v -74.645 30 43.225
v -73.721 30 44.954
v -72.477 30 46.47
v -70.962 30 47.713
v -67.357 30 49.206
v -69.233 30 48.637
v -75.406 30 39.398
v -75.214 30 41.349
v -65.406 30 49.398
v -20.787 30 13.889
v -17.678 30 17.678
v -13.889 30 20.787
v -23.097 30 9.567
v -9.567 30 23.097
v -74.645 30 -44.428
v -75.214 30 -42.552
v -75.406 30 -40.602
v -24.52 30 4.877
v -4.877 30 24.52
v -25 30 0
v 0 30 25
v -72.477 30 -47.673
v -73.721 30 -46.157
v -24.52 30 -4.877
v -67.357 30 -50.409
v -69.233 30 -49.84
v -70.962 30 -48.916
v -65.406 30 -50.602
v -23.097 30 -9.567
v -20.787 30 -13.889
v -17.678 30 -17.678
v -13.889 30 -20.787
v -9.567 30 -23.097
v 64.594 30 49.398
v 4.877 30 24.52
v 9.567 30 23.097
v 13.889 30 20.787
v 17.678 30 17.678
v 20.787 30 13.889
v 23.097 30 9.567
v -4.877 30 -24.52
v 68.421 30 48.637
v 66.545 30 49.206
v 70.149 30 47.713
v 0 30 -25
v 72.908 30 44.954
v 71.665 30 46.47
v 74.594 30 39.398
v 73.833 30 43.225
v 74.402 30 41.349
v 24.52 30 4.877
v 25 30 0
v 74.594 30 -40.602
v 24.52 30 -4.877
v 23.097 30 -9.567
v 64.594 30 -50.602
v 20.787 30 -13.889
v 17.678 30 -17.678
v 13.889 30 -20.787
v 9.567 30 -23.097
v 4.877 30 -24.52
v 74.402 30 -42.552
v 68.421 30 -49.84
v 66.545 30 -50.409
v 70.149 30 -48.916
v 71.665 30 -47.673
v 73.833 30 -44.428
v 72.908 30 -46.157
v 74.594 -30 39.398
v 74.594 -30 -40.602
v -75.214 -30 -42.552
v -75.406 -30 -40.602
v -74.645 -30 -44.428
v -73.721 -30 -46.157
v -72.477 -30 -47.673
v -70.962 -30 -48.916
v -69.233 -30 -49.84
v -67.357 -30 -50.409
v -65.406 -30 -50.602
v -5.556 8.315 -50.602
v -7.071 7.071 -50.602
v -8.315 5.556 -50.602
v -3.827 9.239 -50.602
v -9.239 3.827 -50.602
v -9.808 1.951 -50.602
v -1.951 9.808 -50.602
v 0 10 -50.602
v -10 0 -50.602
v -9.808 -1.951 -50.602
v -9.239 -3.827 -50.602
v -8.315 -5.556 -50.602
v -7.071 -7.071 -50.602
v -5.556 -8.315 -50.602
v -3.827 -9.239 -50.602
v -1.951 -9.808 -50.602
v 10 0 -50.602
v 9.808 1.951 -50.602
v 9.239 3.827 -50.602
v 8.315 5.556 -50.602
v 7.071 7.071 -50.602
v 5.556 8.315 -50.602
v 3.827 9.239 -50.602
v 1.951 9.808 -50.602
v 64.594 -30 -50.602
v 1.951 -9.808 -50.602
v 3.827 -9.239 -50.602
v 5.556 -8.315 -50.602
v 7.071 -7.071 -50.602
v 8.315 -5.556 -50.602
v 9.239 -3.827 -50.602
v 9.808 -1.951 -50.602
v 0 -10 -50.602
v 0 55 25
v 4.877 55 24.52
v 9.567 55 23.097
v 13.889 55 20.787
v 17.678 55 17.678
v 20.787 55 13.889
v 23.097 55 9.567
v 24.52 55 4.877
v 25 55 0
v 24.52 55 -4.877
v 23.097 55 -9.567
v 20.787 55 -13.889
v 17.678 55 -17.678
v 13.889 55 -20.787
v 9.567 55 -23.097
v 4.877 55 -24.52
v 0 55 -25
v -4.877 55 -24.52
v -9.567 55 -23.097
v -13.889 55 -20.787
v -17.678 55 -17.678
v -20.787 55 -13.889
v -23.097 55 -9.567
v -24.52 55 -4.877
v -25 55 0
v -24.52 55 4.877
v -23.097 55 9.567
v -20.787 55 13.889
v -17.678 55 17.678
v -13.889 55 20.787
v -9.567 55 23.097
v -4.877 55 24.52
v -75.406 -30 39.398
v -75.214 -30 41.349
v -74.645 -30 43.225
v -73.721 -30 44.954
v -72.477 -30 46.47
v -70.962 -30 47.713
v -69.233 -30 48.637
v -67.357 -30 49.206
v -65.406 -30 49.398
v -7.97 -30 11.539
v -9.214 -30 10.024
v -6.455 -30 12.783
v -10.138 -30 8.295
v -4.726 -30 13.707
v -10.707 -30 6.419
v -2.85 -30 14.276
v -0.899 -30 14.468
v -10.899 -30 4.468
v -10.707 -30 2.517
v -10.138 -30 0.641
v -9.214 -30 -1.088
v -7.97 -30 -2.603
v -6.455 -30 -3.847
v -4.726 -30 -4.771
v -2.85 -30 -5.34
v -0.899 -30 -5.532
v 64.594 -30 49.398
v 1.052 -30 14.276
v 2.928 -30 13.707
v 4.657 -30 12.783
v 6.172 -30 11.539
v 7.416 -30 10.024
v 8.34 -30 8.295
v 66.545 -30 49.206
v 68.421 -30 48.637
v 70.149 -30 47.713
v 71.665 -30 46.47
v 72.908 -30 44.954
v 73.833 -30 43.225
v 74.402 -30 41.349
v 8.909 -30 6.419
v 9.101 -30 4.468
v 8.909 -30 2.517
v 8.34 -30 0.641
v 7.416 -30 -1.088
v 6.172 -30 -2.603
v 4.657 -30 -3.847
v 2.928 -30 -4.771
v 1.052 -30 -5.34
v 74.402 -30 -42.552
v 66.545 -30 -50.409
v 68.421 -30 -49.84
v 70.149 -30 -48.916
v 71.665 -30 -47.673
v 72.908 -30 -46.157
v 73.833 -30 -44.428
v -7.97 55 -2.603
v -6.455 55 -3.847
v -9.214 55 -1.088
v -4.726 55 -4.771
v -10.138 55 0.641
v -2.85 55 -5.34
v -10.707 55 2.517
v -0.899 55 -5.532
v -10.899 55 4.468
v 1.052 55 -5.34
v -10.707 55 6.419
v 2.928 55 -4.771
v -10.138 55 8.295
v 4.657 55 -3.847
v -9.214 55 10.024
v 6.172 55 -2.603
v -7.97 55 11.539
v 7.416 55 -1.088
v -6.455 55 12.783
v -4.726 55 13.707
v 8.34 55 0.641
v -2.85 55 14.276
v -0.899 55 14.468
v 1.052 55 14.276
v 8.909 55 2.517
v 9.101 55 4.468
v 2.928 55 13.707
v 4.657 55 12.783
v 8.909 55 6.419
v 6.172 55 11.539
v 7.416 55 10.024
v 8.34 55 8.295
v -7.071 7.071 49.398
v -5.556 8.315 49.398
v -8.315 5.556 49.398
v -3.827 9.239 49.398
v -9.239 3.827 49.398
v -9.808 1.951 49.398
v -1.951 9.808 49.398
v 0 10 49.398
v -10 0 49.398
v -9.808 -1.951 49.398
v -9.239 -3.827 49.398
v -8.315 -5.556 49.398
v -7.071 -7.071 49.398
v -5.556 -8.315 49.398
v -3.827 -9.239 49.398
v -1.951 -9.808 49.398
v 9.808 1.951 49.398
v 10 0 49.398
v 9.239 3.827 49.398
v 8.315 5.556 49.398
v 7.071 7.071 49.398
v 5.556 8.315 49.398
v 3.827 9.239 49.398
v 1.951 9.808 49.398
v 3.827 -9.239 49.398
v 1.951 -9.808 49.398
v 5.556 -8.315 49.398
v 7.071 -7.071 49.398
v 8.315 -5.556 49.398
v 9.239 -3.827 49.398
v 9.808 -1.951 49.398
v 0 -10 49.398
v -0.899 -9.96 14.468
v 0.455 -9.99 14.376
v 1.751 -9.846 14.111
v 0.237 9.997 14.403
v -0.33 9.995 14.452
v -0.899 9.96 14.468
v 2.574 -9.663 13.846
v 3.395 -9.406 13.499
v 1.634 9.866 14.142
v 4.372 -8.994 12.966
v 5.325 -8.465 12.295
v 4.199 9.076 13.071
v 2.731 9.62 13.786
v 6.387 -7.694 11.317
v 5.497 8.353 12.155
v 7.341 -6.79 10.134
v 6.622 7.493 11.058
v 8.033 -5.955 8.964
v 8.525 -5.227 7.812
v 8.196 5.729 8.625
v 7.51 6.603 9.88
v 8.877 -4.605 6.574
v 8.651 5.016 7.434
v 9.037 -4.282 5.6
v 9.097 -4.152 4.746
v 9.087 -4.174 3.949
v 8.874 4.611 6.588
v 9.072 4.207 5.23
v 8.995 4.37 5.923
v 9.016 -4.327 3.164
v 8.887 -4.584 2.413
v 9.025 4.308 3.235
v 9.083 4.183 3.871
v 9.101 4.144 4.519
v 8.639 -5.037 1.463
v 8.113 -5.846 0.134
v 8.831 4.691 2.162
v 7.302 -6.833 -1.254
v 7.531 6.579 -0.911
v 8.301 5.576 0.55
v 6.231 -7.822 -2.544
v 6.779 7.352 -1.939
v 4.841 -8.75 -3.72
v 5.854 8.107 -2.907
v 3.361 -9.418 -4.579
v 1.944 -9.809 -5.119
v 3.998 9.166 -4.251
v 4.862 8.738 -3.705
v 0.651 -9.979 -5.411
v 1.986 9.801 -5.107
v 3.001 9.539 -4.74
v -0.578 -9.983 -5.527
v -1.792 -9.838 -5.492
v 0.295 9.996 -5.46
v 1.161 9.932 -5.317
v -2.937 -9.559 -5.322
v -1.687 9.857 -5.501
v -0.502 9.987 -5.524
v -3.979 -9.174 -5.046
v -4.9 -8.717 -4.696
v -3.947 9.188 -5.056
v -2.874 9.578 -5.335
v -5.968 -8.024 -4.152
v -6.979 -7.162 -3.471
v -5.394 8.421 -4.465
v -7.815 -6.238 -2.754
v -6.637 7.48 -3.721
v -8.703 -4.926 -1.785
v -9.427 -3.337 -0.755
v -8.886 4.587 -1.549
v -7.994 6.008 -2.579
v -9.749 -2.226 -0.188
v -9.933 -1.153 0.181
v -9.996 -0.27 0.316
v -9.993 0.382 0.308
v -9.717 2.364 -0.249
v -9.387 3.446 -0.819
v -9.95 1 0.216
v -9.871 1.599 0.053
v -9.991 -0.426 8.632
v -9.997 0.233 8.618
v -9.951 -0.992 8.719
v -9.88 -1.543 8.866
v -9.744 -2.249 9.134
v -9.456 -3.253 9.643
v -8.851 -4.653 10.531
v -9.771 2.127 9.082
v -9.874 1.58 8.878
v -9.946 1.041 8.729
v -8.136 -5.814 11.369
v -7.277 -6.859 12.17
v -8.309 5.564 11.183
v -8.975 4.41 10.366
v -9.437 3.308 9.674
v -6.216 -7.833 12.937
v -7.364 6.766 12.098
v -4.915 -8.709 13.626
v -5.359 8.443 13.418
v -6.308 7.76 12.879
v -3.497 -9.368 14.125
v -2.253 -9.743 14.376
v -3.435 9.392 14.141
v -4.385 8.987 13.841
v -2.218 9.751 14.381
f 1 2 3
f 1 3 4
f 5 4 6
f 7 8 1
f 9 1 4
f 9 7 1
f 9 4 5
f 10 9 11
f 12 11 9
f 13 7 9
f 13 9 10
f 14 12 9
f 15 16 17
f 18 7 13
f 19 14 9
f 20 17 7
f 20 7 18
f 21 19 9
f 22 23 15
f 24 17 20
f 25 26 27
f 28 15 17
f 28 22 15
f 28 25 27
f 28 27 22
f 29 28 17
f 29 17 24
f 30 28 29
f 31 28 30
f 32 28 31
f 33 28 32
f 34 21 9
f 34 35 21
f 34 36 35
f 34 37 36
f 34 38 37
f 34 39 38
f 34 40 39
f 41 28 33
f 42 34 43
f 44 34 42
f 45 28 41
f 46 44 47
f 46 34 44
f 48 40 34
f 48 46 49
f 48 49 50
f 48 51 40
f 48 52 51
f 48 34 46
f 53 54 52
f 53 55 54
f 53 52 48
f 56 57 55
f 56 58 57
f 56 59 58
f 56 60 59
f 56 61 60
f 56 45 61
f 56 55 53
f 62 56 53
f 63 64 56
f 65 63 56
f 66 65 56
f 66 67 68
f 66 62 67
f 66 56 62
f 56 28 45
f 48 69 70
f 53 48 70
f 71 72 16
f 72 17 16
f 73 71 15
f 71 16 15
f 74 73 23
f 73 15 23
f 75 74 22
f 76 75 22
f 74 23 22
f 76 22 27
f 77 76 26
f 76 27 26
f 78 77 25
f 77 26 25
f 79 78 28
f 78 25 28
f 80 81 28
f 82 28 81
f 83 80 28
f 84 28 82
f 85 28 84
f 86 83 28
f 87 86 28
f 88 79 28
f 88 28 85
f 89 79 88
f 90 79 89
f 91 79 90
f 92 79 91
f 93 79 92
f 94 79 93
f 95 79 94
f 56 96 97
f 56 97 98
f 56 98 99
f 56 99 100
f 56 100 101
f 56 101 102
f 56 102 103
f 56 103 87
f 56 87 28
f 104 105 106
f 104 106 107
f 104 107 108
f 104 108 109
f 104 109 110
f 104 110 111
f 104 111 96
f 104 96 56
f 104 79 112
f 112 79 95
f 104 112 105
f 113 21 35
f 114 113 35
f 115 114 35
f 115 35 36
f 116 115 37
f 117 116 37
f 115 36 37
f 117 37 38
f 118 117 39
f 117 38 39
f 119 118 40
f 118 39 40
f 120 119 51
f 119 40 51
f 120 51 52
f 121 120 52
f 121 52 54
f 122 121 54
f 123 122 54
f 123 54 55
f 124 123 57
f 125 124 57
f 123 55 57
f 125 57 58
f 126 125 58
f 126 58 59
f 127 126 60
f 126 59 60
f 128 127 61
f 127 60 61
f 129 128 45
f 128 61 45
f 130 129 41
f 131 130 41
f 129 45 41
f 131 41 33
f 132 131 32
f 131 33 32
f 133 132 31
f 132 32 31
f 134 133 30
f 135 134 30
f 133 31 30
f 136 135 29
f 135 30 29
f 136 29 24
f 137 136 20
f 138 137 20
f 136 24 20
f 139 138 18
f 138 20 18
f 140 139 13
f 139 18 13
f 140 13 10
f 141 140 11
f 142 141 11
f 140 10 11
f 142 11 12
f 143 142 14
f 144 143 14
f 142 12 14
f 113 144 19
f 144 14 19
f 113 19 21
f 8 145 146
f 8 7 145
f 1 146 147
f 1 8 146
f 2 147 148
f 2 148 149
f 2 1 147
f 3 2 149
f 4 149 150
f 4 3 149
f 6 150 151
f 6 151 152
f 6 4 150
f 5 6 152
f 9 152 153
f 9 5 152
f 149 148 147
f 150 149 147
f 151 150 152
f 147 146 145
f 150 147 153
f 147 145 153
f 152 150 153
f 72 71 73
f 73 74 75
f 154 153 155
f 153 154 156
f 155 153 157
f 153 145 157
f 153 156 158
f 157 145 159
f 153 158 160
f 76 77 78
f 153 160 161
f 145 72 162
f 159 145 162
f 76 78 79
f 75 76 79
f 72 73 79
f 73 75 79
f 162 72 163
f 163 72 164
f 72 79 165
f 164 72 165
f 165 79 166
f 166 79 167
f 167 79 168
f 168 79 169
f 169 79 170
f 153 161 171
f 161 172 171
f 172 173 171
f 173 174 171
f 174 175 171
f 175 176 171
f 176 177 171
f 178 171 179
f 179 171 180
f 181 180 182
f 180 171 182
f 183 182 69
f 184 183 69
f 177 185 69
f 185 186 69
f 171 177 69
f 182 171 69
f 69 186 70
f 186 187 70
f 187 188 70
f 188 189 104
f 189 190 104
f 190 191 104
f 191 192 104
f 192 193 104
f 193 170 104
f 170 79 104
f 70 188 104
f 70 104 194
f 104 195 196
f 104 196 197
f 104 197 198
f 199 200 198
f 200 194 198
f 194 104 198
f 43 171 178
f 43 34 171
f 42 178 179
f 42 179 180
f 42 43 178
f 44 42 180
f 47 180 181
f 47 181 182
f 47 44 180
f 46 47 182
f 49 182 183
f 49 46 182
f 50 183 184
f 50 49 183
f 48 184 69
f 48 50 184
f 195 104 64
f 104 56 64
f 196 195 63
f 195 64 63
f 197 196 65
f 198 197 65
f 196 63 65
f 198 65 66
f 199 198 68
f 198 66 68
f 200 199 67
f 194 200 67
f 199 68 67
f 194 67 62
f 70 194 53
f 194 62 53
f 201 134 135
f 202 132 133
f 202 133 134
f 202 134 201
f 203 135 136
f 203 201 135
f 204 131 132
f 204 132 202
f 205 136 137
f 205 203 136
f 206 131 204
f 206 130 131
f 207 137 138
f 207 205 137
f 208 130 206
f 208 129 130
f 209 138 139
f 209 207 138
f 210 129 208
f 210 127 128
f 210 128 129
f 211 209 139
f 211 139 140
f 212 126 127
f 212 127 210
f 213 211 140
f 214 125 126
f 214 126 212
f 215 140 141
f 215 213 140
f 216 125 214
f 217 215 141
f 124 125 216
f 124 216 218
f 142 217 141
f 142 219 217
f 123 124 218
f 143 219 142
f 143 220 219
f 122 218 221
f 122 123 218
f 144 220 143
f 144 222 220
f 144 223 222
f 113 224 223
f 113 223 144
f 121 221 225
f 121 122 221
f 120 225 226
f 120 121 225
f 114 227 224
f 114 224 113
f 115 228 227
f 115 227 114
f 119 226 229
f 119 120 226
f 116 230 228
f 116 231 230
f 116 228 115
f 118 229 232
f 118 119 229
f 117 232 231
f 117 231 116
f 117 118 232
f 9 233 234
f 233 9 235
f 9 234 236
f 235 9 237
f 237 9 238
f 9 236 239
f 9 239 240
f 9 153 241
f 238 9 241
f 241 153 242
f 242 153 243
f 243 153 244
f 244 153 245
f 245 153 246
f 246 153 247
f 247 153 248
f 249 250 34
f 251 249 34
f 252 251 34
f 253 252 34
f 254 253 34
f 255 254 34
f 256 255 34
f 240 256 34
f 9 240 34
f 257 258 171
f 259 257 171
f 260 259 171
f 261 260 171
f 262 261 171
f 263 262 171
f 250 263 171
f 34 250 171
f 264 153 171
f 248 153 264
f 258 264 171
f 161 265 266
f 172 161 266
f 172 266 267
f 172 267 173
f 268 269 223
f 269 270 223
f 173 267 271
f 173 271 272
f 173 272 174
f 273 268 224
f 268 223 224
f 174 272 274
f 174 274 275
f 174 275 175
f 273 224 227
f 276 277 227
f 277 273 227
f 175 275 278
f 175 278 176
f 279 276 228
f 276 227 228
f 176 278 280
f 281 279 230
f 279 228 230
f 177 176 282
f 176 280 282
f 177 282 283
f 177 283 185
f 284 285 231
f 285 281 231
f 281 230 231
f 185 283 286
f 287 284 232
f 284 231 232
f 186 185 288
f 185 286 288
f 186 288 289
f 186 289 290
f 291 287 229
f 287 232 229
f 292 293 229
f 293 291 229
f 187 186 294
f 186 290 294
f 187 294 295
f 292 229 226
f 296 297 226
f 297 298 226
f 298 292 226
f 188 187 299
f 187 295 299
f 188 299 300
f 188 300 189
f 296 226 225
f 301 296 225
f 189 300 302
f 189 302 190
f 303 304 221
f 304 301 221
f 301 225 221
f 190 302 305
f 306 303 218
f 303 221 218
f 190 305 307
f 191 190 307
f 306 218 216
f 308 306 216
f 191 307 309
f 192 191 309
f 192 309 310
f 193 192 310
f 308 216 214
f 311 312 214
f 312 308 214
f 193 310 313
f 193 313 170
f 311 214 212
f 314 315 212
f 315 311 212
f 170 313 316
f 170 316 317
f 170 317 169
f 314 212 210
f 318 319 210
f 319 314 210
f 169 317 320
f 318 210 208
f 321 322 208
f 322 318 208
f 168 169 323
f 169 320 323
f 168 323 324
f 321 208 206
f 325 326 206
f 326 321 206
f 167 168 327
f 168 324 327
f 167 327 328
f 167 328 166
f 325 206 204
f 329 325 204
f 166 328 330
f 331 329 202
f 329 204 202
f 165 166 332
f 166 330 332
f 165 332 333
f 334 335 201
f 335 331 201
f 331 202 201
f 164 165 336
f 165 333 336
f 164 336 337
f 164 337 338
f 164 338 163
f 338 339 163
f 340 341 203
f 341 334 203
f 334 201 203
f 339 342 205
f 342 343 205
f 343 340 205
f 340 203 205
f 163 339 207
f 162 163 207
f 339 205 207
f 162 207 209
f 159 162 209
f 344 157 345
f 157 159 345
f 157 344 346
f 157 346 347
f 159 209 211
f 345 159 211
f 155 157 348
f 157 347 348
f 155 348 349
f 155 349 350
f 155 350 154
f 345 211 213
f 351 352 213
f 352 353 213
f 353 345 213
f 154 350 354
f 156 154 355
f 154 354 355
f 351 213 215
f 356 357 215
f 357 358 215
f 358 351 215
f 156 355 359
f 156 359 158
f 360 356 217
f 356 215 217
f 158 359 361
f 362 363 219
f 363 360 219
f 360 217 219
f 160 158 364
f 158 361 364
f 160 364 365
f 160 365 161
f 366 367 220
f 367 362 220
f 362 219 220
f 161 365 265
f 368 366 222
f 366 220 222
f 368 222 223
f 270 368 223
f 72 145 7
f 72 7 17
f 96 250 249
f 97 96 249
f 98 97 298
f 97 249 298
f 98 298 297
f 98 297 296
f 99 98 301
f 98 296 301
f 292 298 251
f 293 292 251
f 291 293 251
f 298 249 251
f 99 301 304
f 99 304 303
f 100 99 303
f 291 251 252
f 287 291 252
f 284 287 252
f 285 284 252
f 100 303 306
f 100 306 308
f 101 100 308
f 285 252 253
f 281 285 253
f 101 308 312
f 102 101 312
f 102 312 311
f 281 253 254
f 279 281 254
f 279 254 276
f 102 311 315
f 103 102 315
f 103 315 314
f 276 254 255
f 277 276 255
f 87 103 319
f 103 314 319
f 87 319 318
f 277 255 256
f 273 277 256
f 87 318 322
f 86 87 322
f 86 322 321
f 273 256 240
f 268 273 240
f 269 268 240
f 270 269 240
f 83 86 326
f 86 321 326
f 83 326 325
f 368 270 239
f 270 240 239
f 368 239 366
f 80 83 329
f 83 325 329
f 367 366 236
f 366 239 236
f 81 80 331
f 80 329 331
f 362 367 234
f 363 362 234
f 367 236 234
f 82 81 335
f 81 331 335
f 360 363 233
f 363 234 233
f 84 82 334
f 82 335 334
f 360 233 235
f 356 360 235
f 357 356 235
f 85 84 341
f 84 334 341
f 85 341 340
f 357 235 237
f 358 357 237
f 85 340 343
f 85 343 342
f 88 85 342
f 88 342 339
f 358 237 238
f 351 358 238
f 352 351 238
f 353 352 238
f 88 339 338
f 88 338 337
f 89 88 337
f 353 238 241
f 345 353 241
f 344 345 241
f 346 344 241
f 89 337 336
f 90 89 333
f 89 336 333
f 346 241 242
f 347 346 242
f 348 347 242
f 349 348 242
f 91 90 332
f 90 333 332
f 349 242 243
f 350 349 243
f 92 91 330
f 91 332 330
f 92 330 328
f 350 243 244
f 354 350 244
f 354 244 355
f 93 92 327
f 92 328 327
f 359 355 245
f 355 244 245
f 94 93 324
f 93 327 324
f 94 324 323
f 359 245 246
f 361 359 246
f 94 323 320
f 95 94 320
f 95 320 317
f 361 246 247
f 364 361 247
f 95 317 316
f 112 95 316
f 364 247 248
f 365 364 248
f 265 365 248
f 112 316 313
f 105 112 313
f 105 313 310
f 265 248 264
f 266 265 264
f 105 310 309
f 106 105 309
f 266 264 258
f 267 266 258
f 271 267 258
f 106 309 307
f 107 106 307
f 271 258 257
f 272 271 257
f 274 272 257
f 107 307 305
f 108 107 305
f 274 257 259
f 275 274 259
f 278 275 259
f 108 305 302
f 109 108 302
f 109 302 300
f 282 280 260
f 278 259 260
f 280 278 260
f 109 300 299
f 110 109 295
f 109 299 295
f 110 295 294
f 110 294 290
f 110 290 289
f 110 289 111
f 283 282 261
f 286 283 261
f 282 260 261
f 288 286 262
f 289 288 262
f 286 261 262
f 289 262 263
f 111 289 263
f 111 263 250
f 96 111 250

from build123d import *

# Parameters (mm, degrees)
EXTRUDE_1_DEPTH      = 30
EXTRUDE_1_DEPTH_BACK = 30
SKETCH_1_W           = 150
SKETCH_1_H           = 100
FILLET_1_R           = 10
FILLET_2_R           = 10
SKETCH_2_R           = 25
EXTRUDE_2_DEPTH      = 25
SKETCH3_R            = 10
CUT_EXTRUDE1_DEPTH   = 137.788532191
SKETCH4_R            = 10
CUT_EXTRUDE2_DEPTH   = 125.384969617


with BuildPart() as part:
    # Эскиз1 → Вытянуть1 (new, two sides: drawn at the far end of the back side and taken through both)
    with BuildSketch(Plane(origin=(0, 0, 0), x_dir=(1, 0, 0), z_dir=(0, 1, 0)).offset(-EXTRUDE_1_DEPTH_BACK)):
        with Locations((-0.40625, 0.6015625)):
            Rectangle(SKETCH_1_W, SKETCH_1_H)
    extrude(amount=EXTRUDE_1_DEPTH + EXTRUDE_1_DEPTH_BACK)

    # Скругление1
    fillet_1_edges = [part.edges().sort_by_distance(p)[0] for p in [
        (-75.40625, 0, -50.6015625),
    ]]
    fillet(fillet_1_edges, radius=FILLET_1_R)

    # Скругление2
    fillet_2_edges = [part.edges().sort_by_distance(p)[0] for p in [
        (-75.40625, 0, 49.3984375),
        (74.59375, 0, 49.3984375),
        (74.59375, 0, -50.6015625),
    ]]
    fillet(fillet_2_edges, radius=FILLET_2_R)

    # Эскиз2 → Вытянуть2 (add)
    with BuildSketch(Plane(origin=(0, 30, 0), x_dir=(1, 0, 0), z_dir=(0, 1, 0))):
        Circle(SKETCH_2_R)
    extrude(amount=EXTRUDE_2_DEPTH)

    # Sketch3 → Cut-Extrude1 (cut, through all)
    with BuildSketch(Plane.XY.offset(49.3984375)):
        Circle(SKETCH3_R)
    extrude(amount=-CUT_EXTRUDE1_DEPTH, mode=Mode.SUBTRACT)

    # Sketch4 → Cut-Extrude2 (cut, through all)
    with BuildSketch(Plane(origin=(0, 55, 0), x_dir=(1, 0, 0), z_dir=(0, 1, 0))):
        with Locations((-0.899046965, -4.468150991)):
            Circle(SKETCH4_R)
    extrude(amount=-CUT_EXTRUDE2_DEPTH, mode=Mode.SUBTRACT)


solid = part.part
